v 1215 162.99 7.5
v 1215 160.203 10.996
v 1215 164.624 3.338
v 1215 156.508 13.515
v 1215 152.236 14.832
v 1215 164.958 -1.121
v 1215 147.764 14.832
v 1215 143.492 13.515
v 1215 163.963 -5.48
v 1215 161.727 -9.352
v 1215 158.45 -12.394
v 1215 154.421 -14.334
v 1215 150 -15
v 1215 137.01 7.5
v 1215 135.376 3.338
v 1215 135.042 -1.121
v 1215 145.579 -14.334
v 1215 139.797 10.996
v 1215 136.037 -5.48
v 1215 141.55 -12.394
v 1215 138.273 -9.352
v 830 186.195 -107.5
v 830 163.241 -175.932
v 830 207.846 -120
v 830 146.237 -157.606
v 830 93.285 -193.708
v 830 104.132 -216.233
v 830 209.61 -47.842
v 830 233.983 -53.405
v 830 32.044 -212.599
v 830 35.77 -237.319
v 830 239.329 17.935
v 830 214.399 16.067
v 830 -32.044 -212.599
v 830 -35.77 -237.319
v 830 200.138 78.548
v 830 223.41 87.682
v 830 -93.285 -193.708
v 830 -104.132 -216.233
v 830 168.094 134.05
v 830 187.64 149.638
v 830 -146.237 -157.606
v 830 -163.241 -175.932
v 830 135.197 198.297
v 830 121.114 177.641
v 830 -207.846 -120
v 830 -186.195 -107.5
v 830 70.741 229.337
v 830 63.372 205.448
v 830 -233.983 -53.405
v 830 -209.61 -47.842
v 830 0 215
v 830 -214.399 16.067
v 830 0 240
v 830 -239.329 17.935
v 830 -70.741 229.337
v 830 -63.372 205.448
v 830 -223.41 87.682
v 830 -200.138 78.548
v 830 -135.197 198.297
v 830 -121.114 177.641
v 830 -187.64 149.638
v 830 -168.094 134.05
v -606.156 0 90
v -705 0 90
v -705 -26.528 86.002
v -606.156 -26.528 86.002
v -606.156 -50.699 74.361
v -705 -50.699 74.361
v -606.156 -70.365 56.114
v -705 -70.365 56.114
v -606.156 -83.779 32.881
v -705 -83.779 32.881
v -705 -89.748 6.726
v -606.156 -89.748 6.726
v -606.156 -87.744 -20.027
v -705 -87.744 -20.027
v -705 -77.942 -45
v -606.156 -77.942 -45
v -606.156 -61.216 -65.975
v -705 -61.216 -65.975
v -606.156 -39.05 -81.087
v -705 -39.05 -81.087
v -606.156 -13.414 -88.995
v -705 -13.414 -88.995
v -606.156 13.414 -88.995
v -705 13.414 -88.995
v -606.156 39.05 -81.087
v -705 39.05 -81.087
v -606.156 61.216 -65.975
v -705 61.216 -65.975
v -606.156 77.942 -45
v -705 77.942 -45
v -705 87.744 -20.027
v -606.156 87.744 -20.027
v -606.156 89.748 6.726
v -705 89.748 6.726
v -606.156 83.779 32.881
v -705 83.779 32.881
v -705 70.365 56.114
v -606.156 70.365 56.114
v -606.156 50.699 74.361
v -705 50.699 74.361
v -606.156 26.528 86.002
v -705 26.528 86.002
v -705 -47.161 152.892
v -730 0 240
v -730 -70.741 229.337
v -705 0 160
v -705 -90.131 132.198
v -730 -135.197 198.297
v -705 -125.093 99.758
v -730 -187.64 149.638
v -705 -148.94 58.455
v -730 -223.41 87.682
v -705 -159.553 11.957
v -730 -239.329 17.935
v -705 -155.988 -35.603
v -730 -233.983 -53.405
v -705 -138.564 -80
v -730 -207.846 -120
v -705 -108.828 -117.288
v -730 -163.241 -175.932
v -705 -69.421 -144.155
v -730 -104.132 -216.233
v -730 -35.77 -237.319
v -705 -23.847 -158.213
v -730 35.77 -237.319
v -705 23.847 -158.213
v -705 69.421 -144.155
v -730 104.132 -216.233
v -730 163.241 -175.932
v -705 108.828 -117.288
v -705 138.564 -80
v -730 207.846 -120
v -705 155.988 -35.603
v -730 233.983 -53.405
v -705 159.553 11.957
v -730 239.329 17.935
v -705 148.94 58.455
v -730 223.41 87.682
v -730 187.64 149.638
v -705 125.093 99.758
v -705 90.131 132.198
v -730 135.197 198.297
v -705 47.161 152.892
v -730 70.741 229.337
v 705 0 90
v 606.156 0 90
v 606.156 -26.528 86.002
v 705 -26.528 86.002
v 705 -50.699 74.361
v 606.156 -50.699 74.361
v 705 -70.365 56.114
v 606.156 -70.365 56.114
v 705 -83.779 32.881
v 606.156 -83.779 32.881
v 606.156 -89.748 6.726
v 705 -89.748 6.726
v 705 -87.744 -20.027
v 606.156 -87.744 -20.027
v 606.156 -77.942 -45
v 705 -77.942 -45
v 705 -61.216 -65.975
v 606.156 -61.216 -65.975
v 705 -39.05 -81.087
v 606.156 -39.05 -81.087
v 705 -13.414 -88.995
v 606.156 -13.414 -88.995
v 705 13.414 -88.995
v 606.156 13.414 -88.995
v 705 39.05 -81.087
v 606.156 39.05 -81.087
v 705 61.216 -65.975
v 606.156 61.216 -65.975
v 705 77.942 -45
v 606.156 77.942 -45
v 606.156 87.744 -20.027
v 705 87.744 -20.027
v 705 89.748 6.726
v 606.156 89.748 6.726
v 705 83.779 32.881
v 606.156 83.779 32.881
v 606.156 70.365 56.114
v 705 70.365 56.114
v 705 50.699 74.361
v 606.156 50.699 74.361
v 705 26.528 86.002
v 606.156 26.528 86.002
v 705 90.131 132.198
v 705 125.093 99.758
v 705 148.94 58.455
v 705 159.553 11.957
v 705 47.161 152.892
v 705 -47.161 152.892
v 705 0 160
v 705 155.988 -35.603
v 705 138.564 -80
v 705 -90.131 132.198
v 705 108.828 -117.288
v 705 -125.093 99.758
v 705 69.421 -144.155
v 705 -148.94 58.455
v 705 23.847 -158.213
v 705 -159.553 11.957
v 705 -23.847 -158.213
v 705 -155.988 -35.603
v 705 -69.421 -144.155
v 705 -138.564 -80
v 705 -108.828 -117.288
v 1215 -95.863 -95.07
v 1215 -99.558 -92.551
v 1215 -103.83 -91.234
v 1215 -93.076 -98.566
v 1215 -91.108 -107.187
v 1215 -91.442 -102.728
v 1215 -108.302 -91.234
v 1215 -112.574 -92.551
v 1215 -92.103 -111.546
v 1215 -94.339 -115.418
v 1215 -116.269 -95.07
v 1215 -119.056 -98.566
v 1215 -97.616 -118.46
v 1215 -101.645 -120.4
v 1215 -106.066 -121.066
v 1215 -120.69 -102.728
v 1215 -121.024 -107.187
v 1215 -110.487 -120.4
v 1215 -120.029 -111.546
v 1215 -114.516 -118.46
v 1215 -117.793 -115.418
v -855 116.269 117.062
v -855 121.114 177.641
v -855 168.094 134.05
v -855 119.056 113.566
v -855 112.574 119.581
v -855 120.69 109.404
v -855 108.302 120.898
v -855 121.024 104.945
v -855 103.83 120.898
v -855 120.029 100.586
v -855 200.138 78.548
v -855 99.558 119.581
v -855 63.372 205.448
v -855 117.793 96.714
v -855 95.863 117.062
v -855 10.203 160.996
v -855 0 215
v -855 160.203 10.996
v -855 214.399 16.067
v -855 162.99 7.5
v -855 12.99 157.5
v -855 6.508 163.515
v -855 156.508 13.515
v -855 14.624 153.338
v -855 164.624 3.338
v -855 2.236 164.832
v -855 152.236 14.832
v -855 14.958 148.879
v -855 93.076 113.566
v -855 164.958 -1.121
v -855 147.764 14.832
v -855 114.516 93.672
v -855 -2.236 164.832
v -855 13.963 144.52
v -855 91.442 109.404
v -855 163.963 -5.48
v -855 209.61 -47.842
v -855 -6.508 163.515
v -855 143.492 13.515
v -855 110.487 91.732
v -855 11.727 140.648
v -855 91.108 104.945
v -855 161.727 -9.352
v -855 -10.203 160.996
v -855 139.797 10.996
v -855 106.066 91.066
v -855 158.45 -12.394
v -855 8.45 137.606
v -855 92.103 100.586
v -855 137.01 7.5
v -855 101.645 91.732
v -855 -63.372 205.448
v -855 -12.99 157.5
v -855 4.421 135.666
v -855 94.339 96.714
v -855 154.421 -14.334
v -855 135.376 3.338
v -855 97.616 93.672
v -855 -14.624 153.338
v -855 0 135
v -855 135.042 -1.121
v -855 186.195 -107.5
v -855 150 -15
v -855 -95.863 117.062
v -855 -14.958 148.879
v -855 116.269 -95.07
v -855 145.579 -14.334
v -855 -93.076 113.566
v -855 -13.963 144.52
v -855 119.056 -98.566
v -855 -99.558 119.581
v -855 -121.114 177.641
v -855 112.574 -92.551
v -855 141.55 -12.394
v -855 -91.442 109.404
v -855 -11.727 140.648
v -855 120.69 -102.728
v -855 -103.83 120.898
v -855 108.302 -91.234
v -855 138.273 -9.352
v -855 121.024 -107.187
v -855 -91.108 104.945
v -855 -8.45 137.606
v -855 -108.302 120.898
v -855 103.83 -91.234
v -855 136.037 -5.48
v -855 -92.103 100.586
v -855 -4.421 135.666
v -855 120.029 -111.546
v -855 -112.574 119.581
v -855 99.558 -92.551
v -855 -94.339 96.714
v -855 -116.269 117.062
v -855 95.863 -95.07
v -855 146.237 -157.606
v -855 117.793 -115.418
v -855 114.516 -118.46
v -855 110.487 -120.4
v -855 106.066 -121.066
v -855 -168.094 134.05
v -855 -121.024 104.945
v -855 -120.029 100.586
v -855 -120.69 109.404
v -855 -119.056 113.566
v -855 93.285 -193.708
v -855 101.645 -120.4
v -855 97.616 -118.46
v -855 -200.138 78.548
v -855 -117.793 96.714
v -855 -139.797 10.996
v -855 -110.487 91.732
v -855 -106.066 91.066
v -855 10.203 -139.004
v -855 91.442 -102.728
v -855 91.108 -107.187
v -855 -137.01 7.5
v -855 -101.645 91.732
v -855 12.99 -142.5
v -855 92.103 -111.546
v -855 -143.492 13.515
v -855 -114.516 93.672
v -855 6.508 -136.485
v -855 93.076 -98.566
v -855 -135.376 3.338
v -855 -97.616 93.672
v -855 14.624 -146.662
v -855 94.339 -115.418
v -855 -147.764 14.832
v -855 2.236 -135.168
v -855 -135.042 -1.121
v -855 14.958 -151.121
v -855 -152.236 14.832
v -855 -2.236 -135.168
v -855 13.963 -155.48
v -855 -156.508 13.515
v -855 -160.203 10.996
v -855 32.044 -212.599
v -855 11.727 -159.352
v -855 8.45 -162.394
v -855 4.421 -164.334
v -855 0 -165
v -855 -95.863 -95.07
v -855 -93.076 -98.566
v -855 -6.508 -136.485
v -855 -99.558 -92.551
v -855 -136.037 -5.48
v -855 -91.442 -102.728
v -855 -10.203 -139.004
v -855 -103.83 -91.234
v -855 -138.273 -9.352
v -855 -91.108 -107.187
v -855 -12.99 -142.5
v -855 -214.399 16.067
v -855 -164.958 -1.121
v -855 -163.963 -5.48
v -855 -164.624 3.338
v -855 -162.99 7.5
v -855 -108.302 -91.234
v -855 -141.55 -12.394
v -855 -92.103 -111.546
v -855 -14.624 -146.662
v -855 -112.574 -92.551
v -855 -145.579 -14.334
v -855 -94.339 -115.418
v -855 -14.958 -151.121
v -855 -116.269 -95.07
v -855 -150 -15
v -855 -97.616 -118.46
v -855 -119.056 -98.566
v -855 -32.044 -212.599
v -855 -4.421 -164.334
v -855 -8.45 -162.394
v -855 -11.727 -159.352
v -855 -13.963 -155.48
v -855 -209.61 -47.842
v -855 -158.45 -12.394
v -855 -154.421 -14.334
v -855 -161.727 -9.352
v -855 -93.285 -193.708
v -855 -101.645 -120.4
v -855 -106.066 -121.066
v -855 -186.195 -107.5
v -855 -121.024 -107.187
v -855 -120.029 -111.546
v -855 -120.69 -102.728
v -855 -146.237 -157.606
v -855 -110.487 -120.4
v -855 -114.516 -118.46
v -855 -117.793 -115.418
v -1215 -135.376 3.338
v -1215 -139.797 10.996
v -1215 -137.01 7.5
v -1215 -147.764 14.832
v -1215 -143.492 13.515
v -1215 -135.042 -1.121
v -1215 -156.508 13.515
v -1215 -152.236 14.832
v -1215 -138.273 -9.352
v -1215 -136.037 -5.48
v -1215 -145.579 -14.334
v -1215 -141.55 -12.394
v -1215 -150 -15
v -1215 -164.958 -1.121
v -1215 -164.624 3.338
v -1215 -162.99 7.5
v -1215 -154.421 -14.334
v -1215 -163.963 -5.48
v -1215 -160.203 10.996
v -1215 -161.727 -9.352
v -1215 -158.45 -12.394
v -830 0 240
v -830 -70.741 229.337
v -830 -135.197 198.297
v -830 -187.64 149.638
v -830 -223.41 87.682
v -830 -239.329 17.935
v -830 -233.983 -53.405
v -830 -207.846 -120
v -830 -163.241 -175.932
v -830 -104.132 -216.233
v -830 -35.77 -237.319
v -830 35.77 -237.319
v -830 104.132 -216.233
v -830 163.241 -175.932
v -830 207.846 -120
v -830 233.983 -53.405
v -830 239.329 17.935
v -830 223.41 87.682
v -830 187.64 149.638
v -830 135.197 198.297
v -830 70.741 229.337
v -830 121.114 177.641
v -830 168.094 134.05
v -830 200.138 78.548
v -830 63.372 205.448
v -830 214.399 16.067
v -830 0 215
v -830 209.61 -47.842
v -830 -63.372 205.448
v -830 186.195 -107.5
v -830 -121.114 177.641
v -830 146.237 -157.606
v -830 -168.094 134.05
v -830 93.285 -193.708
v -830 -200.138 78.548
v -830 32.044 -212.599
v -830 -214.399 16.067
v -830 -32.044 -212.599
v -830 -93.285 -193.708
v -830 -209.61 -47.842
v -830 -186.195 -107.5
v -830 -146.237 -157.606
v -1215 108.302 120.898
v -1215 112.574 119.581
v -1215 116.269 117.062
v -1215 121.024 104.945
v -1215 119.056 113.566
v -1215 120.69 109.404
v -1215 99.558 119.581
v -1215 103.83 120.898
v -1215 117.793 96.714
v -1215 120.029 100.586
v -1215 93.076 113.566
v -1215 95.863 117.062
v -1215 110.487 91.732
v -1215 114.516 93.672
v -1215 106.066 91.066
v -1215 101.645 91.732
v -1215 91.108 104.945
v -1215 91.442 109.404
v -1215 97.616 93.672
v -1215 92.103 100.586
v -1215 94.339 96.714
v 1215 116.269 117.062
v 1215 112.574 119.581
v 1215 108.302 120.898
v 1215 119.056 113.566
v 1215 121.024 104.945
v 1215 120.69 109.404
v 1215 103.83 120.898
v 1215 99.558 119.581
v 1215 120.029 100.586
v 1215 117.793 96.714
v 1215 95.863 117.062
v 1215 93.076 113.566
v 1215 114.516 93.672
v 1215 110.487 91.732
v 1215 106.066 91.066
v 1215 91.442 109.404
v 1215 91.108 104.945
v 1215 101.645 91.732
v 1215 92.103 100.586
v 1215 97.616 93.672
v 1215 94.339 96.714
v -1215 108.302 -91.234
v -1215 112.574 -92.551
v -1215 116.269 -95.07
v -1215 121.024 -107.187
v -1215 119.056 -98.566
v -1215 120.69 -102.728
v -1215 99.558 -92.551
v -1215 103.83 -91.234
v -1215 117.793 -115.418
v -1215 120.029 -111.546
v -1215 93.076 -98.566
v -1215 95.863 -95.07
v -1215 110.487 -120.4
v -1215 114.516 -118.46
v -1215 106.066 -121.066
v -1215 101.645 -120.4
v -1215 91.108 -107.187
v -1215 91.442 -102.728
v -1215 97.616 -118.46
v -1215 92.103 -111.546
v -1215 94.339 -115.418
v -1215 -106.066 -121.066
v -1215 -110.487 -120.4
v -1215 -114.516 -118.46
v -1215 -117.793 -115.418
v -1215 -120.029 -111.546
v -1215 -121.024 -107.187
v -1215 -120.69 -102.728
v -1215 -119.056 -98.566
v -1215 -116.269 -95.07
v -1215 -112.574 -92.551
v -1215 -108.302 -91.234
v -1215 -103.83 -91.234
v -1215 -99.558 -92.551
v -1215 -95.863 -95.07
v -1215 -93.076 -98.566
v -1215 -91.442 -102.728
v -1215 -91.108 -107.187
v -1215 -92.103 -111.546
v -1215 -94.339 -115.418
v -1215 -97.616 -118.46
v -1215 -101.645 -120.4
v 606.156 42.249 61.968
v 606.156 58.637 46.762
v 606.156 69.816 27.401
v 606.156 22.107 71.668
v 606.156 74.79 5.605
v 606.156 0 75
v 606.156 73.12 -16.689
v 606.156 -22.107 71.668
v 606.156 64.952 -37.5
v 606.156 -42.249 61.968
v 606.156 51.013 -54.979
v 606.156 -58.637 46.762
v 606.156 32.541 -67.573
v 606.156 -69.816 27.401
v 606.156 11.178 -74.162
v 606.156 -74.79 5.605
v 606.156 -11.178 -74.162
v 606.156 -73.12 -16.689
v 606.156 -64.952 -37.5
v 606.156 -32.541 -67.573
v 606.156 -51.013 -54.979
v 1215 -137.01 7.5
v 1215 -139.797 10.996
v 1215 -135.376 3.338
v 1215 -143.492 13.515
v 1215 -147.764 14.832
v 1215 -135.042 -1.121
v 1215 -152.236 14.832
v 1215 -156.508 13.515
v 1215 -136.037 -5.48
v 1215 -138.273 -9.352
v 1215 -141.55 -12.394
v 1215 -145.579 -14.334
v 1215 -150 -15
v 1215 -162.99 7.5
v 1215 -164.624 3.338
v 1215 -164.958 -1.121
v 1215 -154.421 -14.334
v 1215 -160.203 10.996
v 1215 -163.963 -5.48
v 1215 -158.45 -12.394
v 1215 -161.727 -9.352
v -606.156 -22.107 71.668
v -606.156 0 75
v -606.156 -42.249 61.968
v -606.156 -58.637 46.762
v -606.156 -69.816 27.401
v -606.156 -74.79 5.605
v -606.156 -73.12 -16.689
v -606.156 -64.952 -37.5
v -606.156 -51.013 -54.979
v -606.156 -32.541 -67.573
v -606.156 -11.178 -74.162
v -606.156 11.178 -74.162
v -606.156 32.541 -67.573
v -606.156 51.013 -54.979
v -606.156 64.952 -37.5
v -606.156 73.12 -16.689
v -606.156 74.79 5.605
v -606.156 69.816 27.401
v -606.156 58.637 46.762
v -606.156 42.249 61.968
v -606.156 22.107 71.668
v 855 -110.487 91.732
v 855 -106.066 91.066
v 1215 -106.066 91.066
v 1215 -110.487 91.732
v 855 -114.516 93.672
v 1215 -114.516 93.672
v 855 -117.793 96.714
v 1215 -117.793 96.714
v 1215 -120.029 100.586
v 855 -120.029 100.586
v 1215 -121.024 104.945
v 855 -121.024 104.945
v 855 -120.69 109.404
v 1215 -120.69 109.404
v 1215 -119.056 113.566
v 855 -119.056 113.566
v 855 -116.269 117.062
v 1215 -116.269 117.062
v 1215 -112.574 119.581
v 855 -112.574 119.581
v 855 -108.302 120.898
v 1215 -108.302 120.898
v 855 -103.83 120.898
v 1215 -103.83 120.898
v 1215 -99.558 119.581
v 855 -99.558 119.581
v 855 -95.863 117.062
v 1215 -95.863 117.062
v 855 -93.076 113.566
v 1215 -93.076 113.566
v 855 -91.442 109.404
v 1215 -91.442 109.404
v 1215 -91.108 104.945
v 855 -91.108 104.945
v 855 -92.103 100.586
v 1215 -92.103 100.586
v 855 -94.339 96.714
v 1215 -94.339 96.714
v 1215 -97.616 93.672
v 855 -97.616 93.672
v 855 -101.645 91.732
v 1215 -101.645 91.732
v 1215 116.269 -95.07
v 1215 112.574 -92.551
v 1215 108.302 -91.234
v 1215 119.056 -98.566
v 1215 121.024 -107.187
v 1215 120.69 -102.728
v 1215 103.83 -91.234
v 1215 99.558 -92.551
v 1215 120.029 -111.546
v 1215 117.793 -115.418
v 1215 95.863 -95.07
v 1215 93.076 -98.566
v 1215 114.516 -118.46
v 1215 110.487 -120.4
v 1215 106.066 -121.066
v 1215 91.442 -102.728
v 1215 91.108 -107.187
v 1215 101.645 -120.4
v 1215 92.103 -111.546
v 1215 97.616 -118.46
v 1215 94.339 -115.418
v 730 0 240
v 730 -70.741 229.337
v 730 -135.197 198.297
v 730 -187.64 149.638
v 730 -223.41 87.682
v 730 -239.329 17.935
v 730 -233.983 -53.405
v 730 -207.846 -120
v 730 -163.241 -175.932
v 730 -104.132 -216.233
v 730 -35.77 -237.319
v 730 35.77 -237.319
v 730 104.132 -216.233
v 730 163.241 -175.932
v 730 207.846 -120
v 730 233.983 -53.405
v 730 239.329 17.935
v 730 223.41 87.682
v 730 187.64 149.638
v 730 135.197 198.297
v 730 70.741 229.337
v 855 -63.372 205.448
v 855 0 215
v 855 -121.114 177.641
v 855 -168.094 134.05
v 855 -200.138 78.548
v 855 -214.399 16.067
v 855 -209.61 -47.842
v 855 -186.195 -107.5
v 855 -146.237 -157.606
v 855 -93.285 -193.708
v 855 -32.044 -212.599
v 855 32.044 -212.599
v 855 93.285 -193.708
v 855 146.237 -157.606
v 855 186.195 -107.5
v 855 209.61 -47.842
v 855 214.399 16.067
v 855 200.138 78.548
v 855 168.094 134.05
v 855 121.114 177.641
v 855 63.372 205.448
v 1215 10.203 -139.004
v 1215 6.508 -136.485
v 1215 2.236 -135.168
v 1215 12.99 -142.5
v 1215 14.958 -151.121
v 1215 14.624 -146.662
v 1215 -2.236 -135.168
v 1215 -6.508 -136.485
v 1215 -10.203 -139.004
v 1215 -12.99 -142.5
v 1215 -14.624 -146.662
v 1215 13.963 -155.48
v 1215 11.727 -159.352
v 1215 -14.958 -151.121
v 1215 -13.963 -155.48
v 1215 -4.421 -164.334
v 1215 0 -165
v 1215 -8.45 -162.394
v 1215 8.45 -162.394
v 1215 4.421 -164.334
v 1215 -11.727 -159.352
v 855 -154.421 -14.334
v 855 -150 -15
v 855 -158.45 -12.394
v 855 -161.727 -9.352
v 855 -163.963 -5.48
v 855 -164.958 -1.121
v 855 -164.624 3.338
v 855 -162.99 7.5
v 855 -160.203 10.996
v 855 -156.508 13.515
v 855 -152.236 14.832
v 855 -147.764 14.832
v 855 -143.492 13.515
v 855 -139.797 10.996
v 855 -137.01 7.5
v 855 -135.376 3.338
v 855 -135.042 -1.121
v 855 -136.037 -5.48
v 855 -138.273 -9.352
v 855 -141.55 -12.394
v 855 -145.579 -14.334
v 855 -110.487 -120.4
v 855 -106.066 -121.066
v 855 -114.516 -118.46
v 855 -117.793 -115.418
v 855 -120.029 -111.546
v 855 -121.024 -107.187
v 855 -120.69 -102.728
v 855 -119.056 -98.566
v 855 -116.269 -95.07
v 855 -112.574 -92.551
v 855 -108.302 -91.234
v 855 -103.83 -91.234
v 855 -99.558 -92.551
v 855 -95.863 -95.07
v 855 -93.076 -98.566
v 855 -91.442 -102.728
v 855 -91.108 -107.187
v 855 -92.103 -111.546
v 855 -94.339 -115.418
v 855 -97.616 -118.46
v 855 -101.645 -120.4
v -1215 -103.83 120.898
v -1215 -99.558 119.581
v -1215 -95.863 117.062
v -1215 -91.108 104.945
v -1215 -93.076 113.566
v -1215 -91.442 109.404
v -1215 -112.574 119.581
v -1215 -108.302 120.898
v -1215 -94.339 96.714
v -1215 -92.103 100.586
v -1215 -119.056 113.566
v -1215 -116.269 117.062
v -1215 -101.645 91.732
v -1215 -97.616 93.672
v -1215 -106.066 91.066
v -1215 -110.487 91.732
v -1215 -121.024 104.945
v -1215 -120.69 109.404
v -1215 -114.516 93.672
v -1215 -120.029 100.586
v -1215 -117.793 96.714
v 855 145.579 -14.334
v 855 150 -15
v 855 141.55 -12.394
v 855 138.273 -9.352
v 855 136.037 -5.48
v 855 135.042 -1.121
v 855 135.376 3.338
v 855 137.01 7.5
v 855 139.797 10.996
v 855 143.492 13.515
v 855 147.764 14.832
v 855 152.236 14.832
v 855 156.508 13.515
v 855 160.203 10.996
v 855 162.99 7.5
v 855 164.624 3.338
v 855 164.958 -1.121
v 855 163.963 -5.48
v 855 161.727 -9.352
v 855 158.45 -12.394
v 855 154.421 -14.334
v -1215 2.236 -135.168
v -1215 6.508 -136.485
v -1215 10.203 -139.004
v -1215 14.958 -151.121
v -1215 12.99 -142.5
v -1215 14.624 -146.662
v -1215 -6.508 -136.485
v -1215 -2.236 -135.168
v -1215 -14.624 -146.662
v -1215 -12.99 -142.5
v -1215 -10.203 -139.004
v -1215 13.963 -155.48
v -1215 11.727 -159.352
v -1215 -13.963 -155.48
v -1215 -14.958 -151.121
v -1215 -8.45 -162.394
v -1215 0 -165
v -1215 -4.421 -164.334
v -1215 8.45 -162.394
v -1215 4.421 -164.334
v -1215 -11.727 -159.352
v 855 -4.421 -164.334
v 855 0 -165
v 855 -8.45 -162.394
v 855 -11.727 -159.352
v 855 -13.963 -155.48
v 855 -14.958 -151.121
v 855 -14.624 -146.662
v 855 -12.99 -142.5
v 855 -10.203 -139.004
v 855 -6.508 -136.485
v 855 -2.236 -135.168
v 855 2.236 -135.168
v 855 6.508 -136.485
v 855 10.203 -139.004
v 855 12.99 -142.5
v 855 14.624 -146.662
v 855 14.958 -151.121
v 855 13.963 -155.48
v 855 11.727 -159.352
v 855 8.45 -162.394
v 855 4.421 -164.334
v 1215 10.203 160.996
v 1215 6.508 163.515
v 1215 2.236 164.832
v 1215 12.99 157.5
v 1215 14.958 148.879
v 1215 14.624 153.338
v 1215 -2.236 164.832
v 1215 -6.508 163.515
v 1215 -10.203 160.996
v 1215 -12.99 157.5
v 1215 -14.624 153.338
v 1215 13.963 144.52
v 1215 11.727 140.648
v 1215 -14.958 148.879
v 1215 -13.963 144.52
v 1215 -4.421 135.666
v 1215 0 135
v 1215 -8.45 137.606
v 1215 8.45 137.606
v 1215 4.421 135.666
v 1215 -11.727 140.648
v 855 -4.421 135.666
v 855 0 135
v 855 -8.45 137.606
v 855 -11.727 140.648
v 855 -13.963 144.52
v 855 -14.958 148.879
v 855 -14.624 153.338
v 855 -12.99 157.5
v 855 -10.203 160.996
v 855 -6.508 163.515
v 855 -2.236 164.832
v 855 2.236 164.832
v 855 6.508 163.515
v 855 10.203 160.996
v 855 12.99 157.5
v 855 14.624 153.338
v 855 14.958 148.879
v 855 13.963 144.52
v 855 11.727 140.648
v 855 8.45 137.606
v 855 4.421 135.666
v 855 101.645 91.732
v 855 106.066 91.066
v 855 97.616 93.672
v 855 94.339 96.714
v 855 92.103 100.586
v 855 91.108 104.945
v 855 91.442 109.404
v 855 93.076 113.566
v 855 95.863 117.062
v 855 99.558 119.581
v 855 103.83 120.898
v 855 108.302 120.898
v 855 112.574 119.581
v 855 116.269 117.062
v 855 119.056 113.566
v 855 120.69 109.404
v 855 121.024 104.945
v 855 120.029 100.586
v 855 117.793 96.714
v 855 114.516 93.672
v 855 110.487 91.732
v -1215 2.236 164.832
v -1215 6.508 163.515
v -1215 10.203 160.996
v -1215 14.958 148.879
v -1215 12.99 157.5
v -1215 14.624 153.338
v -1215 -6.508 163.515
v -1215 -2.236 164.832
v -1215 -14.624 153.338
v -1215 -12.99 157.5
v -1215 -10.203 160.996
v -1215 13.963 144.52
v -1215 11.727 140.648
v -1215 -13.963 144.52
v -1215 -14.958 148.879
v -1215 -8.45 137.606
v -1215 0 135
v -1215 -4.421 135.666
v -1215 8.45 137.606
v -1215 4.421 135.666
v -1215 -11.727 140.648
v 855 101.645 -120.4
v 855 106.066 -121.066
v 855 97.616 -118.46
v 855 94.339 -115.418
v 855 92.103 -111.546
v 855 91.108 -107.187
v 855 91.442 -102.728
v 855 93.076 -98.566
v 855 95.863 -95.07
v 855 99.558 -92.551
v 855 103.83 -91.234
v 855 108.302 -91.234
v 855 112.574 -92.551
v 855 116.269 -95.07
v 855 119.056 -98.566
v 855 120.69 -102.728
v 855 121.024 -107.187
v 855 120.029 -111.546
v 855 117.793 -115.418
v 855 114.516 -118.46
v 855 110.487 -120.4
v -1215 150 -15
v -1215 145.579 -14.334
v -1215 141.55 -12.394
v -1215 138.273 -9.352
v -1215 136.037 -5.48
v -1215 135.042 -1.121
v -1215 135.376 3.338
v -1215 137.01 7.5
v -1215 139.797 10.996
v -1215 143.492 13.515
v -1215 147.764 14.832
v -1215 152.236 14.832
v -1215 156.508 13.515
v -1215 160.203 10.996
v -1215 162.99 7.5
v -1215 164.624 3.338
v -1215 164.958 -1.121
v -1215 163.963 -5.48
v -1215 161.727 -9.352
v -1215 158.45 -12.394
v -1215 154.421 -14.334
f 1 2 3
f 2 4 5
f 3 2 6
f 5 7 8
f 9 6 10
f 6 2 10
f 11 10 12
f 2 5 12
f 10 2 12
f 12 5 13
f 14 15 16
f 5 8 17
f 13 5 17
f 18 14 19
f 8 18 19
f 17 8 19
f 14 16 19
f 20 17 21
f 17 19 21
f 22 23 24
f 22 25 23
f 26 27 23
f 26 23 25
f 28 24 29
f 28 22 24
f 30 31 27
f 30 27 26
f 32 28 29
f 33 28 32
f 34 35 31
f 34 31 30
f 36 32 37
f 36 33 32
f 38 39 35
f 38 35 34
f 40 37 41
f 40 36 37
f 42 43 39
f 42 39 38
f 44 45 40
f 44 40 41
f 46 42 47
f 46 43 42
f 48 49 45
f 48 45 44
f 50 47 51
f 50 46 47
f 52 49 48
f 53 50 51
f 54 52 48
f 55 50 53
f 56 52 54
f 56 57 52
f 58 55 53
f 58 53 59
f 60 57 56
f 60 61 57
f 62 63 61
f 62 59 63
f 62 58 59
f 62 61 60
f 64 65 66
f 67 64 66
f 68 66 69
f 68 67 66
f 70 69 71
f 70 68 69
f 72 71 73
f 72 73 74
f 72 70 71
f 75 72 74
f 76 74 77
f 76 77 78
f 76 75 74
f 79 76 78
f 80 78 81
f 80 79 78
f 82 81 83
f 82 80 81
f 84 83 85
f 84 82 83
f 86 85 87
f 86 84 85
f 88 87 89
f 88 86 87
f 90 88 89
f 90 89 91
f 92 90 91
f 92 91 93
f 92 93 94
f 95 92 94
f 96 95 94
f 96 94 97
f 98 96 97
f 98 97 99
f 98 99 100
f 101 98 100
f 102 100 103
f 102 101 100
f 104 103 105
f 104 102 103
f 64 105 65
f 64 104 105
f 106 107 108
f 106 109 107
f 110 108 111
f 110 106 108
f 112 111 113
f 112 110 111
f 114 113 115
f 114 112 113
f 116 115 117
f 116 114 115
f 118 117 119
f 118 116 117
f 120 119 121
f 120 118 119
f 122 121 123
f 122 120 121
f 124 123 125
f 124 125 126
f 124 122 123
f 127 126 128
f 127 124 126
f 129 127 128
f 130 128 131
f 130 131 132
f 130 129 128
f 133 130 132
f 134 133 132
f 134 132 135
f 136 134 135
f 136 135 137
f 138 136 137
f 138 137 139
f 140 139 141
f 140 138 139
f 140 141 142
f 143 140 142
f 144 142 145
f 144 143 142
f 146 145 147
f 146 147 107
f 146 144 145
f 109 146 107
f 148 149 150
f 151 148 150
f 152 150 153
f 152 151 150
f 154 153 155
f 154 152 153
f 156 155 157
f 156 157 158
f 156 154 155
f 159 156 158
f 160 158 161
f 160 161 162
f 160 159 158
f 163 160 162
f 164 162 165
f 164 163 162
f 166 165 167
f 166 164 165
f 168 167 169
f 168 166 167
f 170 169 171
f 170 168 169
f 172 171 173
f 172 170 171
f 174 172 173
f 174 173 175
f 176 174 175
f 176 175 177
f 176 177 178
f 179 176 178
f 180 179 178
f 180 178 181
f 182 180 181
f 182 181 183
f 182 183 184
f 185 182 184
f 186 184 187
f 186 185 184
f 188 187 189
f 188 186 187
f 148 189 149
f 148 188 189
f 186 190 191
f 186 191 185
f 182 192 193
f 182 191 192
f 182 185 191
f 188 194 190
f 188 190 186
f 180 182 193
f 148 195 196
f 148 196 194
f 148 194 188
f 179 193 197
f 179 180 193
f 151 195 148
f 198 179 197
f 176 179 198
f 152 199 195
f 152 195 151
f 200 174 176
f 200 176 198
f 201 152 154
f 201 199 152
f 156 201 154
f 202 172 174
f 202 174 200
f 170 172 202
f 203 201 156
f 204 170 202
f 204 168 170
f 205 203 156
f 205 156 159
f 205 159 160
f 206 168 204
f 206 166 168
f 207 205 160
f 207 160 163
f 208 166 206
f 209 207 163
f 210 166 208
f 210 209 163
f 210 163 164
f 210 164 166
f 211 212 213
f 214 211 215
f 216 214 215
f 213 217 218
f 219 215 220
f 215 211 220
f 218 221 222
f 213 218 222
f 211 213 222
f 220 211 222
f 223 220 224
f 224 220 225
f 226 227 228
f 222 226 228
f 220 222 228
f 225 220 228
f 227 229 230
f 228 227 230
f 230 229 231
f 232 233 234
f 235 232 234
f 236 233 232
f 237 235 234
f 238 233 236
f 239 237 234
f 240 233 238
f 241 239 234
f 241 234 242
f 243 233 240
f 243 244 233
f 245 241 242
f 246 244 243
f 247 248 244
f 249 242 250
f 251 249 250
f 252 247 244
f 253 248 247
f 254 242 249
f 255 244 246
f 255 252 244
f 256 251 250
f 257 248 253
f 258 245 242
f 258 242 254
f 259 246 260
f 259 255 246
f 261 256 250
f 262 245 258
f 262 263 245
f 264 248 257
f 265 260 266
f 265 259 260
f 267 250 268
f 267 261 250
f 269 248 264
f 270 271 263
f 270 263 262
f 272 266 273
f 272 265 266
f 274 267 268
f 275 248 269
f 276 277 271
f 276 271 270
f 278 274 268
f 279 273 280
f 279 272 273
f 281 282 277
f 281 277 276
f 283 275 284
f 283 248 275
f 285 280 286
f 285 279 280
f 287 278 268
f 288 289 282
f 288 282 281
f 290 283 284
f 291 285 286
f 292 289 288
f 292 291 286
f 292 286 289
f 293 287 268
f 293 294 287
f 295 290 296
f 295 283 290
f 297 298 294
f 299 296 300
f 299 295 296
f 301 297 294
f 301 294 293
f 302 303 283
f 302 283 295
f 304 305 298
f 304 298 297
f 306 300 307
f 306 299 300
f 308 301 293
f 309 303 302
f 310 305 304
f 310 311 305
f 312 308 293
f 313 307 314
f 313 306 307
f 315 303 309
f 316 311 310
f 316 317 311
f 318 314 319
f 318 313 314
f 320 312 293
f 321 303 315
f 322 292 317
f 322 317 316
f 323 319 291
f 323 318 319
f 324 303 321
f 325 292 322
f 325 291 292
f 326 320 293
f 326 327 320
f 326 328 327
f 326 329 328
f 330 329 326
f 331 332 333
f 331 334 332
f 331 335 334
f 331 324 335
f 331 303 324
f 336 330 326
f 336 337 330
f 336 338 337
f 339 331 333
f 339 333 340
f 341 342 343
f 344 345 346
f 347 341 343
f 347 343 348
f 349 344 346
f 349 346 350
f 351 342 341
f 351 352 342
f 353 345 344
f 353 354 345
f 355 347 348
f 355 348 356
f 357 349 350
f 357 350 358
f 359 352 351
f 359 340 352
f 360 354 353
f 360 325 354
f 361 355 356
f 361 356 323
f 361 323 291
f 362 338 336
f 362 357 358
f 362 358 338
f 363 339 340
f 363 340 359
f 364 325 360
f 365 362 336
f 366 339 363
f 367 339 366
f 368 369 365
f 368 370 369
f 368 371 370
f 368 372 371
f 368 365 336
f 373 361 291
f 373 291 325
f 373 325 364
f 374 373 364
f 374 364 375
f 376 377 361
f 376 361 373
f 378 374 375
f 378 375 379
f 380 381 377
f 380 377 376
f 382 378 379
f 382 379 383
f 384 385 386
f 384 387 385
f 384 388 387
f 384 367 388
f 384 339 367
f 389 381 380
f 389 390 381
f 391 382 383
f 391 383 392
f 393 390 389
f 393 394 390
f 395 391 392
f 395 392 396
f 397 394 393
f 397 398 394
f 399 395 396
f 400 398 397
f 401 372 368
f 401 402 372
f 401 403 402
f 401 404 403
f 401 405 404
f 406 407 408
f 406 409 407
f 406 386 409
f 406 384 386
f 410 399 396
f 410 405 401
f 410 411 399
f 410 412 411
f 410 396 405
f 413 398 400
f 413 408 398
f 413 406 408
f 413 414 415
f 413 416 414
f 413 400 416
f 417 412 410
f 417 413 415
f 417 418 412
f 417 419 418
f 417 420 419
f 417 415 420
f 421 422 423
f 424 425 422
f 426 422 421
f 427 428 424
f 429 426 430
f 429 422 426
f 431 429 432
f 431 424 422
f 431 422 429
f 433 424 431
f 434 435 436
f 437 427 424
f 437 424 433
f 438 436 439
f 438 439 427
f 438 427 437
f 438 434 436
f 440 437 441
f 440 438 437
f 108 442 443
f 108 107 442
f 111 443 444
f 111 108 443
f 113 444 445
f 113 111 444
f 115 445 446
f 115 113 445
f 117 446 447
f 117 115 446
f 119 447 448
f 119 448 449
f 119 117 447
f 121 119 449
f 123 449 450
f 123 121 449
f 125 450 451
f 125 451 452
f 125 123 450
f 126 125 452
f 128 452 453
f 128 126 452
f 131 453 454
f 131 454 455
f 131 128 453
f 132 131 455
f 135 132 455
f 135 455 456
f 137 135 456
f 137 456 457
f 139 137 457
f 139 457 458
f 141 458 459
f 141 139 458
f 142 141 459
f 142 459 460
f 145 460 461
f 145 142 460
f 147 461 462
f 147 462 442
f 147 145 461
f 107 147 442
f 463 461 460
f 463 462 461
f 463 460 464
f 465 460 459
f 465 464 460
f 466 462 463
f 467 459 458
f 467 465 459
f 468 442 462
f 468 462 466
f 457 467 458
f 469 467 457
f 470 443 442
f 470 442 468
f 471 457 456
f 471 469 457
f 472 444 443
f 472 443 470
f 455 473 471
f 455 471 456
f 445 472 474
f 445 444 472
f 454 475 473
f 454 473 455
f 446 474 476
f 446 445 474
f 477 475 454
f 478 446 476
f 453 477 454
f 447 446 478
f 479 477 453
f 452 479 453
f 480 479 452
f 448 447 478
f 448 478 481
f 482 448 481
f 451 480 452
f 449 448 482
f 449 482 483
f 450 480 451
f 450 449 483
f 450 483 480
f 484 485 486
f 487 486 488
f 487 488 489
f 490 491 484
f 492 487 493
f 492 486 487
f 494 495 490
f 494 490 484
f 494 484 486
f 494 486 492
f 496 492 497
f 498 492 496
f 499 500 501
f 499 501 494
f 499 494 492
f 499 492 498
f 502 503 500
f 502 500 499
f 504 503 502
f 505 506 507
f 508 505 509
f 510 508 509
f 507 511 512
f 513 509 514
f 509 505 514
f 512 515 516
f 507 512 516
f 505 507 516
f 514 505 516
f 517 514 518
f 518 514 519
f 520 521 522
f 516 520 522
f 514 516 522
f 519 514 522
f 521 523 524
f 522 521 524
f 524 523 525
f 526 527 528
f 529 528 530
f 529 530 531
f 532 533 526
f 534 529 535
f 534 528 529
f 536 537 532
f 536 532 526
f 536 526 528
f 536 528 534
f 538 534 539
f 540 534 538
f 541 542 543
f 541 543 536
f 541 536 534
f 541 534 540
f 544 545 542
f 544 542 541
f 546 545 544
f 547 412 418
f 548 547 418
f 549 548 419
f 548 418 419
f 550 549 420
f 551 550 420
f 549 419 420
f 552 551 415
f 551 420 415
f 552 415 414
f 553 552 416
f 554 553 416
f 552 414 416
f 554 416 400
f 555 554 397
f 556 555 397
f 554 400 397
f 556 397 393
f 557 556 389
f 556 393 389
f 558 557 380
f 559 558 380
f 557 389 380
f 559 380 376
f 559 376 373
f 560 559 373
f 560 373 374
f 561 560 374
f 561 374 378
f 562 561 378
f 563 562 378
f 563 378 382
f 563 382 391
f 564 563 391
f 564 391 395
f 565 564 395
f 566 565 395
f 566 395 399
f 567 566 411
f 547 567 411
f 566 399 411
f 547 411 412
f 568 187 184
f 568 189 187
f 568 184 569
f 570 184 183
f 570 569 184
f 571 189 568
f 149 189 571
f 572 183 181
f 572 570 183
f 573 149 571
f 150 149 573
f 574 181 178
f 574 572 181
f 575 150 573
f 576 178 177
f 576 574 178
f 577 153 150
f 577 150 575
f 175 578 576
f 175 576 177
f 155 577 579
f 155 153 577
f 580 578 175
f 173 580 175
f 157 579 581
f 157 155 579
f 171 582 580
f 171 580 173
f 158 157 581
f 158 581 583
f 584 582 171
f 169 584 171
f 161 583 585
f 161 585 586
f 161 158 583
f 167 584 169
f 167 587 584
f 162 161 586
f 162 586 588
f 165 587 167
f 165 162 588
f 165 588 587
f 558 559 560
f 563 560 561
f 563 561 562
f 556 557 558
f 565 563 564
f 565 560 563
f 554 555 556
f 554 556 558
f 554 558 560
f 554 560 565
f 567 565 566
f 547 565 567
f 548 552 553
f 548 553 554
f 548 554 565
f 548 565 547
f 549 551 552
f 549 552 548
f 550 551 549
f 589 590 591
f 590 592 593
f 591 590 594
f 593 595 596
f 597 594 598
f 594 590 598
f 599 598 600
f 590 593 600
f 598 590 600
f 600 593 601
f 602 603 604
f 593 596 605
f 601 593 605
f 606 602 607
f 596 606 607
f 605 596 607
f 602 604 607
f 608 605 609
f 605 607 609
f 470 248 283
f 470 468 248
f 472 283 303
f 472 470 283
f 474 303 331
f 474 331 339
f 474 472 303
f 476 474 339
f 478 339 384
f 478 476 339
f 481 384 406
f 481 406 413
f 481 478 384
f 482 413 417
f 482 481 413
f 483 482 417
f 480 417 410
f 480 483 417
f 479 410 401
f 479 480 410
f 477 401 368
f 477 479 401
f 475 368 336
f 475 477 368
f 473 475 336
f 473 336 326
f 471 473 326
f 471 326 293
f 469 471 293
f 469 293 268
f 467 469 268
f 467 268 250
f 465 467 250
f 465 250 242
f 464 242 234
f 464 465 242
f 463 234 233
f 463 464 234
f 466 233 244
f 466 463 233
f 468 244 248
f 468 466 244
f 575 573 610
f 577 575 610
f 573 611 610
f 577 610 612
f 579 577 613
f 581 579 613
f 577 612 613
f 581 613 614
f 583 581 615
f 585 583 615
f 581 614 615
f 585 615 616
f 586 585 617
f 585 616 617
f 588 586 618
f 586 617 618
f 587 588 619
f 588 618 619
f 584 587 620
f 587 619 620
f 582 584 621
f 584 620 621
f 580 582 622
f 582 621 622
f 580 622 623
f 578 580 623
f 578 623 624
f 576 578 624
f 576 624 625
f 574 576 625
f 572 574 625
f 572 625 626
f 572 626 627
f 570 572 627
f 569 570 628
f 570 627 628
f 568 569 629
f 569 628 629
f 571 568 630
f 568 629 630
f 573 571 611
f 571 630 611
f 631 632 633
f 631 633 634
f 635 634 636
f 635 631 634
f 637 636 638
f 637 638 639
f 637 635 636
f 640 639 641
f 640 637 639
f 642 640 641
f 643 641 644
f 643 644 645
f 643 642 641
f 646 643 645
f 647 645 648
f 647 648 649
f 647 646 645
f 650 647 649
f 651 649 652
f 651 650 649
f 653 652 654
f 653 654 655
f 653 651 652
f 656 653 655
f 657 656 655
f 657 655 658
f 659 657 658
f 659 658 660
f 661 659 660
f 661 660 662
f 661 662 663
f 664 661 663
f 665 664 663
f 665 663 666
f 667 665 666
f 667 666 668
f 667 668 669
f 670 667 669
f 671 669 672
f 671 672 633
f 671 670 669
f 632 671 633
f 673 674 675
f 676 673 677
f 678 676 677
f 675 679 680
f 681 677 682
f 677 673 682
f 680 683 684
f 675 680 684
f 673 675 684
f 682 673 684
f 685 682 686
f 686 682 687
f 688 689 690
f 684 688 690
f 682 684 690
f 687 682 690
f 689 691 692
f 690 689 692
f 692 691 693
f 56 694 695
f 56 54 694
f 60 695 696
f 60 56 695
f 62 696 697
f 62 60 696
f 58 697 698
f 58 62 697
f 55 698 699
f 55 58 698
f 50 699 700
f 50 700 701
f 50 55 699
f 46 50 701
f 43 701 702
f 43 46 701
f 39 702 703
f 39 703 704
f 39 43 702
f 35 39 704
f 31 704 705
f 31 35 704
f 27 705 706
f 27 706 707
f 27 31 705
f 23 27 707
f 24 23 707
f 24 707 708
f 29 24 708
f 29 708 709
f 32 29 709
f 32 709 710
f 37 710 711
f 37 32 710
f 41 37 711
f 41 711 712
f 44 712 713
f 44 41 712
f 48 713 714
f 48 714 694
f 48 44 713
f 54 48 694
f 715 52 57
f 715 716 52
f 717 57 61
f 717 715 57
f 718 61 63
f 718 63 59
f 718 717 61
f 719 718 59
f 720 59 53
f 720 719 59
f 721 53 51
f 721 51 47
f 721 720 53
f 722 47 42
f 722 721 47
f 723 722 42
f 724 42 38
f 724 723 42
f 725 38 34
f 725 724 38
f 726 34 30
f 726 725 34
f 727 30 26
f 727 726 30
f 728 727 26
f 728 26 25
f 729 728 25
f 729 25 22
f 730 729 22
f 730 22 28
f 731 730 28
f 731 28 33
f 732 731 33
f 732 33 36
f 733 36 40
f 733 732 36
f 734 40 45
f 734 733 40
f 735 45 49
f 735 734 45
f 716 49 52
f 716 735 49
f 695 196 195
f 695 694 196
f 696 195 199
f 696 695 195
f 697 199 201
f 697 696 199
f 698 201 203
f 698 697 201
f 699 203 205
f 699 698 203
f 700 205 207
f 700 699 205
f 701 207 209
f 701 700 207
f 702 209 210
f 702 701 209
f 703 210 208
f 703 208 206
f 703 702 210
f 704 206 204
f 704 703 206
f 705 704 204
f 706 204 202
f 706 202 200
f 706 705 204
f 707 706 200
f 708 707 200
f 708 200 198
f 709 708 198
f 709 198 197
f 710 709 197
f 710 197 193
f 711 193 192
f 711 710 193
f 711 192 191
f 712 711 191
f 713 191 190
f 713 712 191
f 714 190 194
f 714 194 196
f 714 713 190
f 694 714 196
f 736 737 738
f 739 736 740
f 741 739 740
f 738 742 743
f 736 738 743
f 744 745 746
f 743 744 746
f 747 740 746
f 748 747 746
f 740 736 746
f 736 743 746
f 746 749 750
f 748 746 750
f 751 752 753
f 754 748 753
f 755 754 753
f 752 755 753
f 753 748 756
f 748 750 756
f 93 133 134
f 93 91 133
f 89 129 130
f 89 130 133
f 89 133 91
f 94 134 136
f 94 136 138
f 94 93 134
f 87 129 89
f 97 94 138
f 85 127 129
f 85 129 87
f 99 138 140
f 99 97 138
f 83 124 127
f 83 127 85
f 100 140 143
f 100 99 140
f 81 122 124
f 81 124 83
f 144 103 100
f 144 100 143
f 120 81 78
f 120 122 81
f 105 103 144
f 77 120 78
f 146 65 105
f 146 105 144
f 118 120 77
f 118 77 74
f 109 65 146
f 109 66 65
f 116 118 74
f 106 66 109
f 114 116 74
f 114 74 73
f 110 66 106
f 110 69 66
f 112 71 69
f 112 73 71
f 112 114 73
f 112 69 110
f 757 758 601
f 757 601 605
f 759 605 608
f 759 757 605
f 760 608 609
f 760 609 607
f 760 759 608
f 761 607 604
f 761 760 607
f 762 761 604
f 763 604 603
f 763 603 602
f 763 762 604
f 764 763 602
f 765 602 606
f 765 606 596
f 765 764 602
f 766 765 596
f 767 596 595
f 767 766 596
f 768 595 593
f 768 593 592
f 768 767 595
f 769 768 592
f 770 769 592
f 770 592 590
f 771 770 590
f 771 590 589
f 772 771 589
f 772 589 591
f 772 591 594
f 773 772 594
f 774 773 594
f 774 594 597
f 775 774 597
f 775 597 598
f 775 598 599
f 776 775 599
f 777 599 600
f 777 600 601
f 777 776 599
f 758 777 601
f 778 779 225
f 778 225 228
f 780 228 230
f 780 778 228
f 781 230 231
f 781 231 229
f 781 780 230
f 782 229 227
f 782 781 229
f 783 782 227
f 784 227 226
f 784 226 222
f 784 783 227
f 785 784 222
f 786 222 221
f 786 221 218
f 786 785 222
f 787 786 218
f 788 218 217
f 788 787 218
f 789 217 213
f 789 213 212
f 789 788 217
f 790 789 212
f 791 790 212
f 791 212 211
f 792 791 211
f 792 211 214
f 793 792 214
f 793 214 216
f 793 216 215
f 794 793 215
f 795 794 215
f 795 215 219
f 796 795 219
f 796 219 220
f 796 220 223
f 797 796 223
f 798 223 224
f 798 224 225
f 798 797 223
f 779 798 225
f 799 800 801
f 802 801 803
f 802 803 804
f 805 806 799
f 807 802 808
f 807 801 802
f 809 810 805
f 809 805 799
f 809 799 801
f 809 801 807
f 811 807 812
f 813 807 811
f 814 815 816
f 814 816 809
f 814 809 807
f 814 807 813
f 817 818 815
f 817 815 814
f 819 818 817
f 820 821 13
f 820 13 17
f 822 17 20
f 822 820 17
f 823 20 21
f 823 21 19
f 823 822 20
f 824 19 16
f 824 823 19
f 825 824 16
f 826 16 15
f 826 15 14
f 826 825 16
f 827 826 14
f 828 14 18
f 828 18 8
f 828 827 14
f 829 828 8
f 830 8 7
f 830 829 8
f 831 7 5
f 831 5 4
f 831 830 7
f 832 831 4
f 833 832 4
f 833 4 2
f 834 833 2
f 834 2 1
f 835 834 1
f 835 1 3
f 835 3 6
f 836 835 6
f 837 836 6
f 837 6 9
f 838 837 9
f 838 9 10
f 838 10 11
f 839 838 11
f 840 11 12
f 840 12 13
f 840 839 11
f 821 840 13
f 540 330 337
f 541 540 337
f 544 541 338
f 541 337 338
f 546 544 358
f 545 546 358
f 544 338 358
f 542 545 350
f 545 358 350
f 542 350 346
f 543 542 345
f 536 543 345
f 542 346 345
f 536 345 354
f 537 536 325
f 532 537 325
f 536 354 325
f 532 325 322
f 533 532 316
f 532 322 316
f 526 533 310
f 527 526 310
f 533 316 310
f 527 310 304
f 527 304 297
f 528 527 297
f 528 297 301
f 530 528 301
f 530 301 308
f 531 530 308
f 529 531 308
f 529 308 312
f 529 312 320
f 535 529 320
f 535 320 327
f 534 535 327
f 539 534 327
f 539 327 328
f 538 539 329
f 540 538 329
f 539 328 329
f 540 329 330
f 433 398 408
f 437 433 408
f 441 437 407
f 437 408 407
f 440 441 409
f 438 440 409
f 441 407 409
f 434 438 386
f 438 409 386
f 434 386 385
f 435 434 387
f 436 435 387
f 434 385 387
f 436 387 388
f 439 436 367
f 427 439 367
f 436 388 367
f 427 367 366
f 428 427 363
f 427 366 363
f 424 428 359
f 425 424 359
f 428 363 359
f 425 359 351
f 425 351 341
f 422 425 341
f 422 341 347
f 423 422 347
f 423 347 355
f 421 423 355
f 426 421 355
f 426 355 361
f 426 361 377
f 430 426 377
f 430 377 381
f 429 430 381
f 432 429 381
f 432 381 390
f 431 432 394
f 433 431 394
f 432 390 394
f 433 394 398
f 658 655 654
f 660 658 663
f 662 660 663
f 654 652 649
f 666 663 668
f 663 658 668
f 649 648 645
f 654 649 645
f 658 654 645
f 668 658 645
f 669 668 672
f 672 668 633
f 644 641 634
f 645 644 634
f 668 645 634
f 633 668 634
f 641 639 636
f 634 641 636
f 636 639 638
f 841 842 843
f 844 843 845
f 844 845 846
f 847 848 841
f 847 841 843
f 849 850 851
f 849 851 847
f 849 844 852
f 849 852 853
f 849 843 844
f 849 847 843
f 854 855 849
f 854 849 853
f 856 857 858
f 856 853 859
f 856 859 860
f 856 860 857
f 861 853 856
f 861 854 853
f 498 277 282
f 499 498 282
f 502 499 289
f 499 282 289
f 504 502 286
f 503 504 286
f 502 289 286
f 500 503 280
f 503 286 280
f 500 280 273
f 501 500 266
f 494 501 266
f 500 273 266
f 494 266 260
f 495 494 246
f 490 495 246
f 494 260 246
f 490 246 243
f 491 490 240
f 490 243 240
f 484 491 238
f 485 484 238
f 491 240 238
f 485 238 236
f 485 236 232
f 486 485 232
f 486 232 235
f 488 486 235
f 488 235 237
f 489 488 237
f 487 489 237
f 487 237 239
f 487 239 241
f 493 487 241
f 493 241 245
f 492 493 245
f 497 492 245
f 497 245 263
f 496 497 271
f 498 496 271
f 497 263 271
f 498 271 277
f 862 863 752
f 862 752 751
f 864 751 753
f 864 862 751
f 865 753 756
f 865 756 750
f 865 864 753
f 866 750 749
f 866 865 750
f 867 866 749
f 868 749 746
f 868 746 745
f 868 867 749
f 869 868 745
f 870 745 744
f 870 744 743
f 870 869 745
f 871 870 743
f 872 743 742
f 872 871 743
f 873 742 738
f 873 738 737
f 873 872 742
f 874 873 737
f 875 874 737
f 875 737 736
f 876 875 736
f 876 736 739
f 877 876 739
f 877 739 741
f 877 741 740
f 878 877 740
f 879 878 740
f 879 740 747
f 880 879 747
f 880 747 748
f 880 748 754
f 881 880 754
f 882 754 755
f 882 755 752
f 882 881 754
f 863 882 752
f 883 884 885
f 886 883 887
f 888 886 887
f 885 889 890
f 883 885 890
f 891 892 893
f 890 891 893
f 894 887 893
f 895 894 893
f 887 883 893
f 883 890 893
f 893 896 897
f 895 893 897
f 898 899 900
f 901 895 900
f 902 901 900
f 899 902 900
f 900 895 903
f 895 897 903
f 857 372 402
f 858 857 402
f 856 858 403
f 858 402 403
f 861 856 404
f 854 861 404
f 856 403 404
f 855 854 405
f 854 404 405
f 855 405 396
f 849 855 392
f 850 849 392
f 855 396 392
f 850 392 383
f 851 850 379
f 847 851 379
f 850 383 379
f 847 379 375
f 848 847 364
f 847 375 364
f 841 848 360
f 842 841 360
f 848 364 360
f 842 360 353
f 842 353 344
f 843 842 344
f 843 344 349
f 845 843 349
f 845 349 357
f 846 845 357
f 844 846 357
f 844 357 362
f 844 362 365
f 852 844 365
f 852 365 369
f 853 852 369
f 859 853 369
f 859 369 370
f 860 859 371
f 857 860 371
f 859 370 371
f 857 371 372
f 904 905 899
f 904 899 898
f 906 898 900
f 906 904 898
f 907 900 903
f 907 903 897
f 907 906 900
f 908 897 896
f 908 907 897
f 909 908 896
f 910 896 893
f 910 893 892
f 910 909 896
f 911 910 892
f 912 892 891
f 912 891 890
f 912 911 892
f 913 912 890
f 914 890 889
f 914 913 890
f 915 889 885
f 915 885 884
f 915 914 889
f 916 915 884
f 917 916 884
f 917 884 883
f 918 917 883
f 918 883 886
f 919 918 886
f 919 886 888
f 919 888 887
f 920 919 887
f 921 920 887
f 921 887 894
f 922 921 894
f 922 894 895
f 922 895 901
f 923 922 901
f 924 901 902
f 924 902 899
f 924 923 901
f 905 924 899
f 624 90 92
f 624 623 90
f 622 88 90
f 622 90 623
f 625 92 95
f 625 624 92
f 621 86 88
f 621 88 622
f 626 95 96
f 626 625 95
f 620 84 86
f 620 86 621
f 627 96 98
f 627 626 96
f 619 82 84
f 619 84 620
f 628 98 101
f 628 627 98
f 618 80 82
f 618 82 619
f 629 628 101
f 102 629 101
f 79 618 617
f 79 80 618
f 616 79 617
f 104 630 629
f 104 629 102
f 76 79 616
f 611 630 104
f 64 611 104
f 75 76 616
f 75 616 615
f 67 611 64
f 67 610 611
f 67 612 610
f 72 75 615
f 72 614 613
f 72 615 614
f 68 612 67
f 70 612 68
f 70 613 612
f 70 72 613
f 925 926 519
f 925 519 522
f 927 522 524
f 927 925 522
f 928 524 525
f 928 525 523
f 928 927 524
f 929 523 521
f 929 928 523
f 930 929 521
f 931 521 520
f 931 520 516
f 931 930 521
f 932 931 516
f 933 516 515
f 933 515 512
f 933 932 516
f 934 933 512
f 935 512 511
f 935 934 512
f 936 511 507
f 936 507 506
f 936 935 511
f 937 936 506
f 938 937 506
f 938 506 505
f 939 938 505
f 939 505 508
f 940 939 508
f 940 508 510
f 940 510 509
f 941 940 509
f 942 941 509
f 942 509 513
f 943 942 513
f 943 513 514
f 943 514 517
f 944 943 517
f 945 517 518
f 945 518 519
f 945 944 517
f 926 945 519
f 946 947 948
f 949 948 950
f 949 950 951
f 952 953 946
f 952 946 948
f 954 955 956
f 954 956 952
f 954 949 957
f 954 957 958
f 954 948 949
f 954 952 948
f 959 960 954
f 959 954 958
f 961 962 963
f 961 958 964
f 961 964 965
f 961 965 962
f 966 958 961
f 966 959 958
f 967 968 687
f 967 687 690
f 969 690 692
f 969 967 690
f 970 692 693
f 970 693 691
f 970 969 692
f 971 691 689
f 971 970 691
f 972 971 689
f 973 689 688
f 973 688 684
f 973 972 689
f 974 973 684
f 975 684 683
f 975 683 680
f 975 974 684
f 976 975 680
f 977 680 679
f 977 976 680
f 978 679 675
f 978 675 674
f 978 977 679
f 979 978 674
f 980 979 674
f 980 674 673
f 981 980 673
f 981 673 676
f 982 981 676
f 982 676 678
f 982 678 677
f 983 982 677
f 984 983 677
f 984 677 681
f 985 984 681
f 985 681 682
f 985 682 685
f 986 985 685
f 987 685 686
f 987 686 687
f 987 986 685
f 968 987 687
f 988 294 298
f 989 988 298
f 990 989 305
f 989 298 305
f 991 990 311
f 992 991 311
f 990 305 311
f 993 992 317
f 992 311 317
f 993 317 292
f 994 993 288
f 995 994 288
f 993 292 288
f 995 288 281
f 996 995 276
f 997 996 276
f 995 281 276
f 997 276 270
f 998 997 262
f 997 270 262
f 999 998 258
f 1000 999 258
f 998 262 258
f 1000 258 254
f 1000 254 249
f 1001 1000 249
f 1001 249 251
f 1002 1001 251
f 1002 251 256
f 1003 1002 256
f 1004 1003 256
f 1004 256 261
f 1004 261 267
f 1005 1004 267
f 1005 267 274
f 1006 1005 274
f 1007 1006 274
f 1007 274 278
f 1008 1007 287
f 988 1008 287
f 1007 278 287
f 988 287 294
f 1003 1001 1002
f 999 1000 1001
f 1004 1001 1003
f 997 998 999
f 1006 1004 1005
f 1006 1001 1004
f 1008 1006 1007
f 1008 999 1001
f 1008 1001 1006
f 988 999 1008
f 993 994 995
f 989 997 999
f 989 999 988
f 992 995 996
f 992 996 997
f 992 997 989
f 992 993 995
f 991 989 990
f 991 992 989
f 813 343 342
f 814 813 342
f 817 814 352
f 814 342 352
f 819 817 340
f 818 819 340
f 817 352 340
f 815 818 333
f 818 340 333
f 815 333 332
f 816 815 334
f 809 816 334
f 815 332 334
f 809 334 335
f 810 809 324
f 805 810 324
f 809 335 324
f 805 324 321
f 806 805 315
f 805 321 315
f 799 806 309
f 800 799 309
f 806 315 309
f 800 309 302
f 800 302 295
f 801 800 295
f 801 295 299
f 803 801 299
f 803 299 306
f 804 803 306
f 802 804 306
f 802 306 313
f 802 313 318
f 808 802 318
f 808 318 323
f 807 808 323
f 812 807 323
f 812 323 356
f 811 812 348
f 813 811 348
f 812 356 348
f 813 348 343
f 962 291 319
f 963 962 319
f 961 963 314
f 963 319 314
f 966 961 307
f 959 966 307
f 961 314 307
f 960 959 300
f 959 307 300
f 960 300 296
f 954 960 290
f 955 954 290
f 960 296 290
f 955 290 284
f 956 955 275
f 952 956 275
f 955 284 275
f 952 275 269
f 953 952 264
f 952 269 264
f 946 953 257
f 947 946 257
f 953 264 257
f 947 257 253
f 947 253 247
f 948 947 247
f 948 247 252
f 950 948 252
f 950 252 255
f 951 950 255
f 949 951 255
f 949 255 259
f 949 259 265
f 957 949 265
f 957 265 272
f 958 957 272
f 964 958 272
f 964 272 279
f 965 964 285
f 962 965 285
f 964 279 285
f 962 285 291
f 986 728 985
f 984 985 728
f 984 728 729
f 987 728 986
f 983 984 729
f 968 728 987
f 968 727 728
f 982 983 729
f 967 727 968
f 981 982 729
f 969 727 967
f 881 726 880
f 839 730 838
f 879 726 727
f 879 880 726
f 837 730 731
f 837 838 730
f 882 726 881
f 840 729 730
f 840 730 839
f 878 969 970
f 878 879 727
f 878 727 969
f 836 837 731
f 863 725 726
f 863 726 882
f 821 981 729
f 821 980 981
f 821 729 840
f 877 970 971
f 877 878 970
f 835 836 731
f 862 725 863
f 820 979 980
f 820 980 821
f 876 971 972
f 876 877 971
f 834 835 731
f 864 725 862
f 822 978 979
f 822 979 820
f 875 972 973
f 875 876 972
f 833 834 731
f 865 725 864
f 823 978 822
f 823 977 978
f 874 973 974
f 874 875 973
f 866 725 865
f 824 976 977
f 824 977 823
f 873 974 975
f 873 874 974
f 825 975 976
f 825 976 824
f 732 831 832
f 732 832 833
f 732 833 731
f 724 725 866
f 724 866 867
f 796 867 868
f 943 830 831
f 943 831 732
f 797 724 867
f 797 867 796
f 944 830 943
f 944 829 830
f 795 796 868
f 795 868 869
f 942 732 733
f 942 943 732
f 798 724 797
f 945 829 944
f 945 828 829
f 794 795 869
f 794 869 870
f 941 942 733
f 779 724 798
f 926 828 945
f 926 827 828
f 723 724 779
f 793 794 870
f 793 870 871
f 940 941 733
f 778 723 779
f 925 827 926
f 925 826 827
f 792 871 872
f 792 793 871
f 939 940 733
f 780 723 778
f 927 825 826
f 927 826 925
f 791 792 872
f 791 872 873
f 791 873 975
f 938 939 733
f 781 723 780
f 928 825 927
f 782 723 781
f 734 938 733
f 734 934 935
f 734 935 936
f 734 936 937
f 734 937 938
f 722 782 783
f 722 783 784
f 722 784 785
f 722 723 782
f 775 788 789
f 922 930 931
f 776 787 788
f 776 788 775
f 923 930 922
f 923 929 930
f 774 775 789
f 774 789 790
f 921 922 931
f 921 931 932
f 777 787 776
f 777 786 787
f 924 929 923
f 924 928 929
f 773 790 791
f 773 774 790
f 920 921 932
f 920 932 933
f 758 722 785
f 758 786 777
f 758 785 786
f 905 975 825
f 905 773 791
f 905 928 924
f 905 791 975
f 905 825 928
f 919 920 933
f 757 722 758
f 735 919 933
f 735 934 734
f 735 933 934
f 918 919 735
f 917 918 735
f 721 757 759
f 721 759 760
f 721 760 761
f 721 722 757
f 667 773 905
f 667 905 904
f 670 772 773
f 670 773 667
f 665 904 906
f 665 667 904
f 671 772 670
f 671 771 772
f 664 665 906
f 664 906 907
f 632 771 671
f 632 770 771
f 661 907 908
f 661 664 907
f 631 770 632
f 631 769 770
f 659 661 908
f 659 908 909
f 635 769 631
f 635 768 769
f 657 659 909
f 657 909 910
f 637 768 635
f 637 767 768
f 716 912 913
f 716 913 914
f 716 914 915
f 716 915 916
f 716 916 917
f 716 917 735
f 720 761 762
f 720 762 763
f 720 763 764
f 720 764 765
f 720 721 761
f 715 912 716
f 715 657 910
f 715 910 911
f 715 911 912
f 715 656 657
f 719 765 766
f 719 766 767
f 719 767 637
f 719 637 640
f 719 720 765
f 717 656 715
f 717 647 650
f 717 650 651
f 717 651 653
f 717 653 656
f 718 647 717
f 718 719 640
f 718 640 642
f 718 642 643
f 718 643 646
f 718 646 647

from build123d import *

# Parameters (mm, degrees)
SKETCH2_R           = 15
BOSS_EXTRUDE1_DEPTH = 360


with BuildPart() as part:
    # Sketch1 → Revolve1 (revolve)
    with BuildSketch(Plane.XY, mode=Mode.PRIVATE) as revolve1_sk:
        Polygon((-855, 0), (-855, 215), (-830, 215), (-830, 240), (-730, 240), (-705, 160), (-705, 90), (-606.156213382, 90), (-606.156213382, 75), (-129.903810568, 75), (129.903810568, 75), (606.156213382, 75), (606.156213382, 90), (705, 90), (705, 160), (730, 240), (830, 240), (830, 215), (855, 215), (855, 0), align=None)
    revolve(revolve1_sk.sketch.rotate(Axis((-1250, 0, 0), (1, 0, 0)), 90), axis=Axis((-1250, 0, 0), (1, 0, 0)))

    # Sketch2 → Boss-Extrude1 (add)
    with BuildSketch(Plane.ZY.offset(855)):
        with Locations(Location((0, 150, 0), (0, 0, 180))):
            Circle(SKETCH2_R)
        with Locations(Location((106.066017178, 106.066017178, 0), (0, 0, 180))):
            Circle(SKETCH2_R)
        with Locations(Location((150, 0, 0), (0, 0, 180))):
            Circle(SKETCH2_R)
        with Locations(Location((106.066017178, -106.066017178, 0), (0, 0, 180))):
            Circle(SKETCH2_R)
        with Locations(Location((0, -150, 0), (0, 0, 180))):
            Circle(SKETCH2_R)
        with Locations(Location((-106.066017178, -106.066017178, 0), (0, 0, 180))):
            Circle(SKETCH2_R)
        with Locations(Location((-150, 0, 0), (0, 0, 180))):
            Circle(SKETCH2_R)
        with Locations(Location((-106.066017178, 106.066017178, 0), (0, 0, 180))):
            Circle(SKETCH2_R)
    boss_extrude1 = extrude(amount=BOSS_EXTRUDE1_DEPTH)

    # Mirror1: Boss-Extrude1 across plane
    add(boss_extrude1.mirror(Plane(origin=(0, 0, 0), x_dir=(0, 0, 1), z_dir=(1, 0, 0))))


solid = part.part
